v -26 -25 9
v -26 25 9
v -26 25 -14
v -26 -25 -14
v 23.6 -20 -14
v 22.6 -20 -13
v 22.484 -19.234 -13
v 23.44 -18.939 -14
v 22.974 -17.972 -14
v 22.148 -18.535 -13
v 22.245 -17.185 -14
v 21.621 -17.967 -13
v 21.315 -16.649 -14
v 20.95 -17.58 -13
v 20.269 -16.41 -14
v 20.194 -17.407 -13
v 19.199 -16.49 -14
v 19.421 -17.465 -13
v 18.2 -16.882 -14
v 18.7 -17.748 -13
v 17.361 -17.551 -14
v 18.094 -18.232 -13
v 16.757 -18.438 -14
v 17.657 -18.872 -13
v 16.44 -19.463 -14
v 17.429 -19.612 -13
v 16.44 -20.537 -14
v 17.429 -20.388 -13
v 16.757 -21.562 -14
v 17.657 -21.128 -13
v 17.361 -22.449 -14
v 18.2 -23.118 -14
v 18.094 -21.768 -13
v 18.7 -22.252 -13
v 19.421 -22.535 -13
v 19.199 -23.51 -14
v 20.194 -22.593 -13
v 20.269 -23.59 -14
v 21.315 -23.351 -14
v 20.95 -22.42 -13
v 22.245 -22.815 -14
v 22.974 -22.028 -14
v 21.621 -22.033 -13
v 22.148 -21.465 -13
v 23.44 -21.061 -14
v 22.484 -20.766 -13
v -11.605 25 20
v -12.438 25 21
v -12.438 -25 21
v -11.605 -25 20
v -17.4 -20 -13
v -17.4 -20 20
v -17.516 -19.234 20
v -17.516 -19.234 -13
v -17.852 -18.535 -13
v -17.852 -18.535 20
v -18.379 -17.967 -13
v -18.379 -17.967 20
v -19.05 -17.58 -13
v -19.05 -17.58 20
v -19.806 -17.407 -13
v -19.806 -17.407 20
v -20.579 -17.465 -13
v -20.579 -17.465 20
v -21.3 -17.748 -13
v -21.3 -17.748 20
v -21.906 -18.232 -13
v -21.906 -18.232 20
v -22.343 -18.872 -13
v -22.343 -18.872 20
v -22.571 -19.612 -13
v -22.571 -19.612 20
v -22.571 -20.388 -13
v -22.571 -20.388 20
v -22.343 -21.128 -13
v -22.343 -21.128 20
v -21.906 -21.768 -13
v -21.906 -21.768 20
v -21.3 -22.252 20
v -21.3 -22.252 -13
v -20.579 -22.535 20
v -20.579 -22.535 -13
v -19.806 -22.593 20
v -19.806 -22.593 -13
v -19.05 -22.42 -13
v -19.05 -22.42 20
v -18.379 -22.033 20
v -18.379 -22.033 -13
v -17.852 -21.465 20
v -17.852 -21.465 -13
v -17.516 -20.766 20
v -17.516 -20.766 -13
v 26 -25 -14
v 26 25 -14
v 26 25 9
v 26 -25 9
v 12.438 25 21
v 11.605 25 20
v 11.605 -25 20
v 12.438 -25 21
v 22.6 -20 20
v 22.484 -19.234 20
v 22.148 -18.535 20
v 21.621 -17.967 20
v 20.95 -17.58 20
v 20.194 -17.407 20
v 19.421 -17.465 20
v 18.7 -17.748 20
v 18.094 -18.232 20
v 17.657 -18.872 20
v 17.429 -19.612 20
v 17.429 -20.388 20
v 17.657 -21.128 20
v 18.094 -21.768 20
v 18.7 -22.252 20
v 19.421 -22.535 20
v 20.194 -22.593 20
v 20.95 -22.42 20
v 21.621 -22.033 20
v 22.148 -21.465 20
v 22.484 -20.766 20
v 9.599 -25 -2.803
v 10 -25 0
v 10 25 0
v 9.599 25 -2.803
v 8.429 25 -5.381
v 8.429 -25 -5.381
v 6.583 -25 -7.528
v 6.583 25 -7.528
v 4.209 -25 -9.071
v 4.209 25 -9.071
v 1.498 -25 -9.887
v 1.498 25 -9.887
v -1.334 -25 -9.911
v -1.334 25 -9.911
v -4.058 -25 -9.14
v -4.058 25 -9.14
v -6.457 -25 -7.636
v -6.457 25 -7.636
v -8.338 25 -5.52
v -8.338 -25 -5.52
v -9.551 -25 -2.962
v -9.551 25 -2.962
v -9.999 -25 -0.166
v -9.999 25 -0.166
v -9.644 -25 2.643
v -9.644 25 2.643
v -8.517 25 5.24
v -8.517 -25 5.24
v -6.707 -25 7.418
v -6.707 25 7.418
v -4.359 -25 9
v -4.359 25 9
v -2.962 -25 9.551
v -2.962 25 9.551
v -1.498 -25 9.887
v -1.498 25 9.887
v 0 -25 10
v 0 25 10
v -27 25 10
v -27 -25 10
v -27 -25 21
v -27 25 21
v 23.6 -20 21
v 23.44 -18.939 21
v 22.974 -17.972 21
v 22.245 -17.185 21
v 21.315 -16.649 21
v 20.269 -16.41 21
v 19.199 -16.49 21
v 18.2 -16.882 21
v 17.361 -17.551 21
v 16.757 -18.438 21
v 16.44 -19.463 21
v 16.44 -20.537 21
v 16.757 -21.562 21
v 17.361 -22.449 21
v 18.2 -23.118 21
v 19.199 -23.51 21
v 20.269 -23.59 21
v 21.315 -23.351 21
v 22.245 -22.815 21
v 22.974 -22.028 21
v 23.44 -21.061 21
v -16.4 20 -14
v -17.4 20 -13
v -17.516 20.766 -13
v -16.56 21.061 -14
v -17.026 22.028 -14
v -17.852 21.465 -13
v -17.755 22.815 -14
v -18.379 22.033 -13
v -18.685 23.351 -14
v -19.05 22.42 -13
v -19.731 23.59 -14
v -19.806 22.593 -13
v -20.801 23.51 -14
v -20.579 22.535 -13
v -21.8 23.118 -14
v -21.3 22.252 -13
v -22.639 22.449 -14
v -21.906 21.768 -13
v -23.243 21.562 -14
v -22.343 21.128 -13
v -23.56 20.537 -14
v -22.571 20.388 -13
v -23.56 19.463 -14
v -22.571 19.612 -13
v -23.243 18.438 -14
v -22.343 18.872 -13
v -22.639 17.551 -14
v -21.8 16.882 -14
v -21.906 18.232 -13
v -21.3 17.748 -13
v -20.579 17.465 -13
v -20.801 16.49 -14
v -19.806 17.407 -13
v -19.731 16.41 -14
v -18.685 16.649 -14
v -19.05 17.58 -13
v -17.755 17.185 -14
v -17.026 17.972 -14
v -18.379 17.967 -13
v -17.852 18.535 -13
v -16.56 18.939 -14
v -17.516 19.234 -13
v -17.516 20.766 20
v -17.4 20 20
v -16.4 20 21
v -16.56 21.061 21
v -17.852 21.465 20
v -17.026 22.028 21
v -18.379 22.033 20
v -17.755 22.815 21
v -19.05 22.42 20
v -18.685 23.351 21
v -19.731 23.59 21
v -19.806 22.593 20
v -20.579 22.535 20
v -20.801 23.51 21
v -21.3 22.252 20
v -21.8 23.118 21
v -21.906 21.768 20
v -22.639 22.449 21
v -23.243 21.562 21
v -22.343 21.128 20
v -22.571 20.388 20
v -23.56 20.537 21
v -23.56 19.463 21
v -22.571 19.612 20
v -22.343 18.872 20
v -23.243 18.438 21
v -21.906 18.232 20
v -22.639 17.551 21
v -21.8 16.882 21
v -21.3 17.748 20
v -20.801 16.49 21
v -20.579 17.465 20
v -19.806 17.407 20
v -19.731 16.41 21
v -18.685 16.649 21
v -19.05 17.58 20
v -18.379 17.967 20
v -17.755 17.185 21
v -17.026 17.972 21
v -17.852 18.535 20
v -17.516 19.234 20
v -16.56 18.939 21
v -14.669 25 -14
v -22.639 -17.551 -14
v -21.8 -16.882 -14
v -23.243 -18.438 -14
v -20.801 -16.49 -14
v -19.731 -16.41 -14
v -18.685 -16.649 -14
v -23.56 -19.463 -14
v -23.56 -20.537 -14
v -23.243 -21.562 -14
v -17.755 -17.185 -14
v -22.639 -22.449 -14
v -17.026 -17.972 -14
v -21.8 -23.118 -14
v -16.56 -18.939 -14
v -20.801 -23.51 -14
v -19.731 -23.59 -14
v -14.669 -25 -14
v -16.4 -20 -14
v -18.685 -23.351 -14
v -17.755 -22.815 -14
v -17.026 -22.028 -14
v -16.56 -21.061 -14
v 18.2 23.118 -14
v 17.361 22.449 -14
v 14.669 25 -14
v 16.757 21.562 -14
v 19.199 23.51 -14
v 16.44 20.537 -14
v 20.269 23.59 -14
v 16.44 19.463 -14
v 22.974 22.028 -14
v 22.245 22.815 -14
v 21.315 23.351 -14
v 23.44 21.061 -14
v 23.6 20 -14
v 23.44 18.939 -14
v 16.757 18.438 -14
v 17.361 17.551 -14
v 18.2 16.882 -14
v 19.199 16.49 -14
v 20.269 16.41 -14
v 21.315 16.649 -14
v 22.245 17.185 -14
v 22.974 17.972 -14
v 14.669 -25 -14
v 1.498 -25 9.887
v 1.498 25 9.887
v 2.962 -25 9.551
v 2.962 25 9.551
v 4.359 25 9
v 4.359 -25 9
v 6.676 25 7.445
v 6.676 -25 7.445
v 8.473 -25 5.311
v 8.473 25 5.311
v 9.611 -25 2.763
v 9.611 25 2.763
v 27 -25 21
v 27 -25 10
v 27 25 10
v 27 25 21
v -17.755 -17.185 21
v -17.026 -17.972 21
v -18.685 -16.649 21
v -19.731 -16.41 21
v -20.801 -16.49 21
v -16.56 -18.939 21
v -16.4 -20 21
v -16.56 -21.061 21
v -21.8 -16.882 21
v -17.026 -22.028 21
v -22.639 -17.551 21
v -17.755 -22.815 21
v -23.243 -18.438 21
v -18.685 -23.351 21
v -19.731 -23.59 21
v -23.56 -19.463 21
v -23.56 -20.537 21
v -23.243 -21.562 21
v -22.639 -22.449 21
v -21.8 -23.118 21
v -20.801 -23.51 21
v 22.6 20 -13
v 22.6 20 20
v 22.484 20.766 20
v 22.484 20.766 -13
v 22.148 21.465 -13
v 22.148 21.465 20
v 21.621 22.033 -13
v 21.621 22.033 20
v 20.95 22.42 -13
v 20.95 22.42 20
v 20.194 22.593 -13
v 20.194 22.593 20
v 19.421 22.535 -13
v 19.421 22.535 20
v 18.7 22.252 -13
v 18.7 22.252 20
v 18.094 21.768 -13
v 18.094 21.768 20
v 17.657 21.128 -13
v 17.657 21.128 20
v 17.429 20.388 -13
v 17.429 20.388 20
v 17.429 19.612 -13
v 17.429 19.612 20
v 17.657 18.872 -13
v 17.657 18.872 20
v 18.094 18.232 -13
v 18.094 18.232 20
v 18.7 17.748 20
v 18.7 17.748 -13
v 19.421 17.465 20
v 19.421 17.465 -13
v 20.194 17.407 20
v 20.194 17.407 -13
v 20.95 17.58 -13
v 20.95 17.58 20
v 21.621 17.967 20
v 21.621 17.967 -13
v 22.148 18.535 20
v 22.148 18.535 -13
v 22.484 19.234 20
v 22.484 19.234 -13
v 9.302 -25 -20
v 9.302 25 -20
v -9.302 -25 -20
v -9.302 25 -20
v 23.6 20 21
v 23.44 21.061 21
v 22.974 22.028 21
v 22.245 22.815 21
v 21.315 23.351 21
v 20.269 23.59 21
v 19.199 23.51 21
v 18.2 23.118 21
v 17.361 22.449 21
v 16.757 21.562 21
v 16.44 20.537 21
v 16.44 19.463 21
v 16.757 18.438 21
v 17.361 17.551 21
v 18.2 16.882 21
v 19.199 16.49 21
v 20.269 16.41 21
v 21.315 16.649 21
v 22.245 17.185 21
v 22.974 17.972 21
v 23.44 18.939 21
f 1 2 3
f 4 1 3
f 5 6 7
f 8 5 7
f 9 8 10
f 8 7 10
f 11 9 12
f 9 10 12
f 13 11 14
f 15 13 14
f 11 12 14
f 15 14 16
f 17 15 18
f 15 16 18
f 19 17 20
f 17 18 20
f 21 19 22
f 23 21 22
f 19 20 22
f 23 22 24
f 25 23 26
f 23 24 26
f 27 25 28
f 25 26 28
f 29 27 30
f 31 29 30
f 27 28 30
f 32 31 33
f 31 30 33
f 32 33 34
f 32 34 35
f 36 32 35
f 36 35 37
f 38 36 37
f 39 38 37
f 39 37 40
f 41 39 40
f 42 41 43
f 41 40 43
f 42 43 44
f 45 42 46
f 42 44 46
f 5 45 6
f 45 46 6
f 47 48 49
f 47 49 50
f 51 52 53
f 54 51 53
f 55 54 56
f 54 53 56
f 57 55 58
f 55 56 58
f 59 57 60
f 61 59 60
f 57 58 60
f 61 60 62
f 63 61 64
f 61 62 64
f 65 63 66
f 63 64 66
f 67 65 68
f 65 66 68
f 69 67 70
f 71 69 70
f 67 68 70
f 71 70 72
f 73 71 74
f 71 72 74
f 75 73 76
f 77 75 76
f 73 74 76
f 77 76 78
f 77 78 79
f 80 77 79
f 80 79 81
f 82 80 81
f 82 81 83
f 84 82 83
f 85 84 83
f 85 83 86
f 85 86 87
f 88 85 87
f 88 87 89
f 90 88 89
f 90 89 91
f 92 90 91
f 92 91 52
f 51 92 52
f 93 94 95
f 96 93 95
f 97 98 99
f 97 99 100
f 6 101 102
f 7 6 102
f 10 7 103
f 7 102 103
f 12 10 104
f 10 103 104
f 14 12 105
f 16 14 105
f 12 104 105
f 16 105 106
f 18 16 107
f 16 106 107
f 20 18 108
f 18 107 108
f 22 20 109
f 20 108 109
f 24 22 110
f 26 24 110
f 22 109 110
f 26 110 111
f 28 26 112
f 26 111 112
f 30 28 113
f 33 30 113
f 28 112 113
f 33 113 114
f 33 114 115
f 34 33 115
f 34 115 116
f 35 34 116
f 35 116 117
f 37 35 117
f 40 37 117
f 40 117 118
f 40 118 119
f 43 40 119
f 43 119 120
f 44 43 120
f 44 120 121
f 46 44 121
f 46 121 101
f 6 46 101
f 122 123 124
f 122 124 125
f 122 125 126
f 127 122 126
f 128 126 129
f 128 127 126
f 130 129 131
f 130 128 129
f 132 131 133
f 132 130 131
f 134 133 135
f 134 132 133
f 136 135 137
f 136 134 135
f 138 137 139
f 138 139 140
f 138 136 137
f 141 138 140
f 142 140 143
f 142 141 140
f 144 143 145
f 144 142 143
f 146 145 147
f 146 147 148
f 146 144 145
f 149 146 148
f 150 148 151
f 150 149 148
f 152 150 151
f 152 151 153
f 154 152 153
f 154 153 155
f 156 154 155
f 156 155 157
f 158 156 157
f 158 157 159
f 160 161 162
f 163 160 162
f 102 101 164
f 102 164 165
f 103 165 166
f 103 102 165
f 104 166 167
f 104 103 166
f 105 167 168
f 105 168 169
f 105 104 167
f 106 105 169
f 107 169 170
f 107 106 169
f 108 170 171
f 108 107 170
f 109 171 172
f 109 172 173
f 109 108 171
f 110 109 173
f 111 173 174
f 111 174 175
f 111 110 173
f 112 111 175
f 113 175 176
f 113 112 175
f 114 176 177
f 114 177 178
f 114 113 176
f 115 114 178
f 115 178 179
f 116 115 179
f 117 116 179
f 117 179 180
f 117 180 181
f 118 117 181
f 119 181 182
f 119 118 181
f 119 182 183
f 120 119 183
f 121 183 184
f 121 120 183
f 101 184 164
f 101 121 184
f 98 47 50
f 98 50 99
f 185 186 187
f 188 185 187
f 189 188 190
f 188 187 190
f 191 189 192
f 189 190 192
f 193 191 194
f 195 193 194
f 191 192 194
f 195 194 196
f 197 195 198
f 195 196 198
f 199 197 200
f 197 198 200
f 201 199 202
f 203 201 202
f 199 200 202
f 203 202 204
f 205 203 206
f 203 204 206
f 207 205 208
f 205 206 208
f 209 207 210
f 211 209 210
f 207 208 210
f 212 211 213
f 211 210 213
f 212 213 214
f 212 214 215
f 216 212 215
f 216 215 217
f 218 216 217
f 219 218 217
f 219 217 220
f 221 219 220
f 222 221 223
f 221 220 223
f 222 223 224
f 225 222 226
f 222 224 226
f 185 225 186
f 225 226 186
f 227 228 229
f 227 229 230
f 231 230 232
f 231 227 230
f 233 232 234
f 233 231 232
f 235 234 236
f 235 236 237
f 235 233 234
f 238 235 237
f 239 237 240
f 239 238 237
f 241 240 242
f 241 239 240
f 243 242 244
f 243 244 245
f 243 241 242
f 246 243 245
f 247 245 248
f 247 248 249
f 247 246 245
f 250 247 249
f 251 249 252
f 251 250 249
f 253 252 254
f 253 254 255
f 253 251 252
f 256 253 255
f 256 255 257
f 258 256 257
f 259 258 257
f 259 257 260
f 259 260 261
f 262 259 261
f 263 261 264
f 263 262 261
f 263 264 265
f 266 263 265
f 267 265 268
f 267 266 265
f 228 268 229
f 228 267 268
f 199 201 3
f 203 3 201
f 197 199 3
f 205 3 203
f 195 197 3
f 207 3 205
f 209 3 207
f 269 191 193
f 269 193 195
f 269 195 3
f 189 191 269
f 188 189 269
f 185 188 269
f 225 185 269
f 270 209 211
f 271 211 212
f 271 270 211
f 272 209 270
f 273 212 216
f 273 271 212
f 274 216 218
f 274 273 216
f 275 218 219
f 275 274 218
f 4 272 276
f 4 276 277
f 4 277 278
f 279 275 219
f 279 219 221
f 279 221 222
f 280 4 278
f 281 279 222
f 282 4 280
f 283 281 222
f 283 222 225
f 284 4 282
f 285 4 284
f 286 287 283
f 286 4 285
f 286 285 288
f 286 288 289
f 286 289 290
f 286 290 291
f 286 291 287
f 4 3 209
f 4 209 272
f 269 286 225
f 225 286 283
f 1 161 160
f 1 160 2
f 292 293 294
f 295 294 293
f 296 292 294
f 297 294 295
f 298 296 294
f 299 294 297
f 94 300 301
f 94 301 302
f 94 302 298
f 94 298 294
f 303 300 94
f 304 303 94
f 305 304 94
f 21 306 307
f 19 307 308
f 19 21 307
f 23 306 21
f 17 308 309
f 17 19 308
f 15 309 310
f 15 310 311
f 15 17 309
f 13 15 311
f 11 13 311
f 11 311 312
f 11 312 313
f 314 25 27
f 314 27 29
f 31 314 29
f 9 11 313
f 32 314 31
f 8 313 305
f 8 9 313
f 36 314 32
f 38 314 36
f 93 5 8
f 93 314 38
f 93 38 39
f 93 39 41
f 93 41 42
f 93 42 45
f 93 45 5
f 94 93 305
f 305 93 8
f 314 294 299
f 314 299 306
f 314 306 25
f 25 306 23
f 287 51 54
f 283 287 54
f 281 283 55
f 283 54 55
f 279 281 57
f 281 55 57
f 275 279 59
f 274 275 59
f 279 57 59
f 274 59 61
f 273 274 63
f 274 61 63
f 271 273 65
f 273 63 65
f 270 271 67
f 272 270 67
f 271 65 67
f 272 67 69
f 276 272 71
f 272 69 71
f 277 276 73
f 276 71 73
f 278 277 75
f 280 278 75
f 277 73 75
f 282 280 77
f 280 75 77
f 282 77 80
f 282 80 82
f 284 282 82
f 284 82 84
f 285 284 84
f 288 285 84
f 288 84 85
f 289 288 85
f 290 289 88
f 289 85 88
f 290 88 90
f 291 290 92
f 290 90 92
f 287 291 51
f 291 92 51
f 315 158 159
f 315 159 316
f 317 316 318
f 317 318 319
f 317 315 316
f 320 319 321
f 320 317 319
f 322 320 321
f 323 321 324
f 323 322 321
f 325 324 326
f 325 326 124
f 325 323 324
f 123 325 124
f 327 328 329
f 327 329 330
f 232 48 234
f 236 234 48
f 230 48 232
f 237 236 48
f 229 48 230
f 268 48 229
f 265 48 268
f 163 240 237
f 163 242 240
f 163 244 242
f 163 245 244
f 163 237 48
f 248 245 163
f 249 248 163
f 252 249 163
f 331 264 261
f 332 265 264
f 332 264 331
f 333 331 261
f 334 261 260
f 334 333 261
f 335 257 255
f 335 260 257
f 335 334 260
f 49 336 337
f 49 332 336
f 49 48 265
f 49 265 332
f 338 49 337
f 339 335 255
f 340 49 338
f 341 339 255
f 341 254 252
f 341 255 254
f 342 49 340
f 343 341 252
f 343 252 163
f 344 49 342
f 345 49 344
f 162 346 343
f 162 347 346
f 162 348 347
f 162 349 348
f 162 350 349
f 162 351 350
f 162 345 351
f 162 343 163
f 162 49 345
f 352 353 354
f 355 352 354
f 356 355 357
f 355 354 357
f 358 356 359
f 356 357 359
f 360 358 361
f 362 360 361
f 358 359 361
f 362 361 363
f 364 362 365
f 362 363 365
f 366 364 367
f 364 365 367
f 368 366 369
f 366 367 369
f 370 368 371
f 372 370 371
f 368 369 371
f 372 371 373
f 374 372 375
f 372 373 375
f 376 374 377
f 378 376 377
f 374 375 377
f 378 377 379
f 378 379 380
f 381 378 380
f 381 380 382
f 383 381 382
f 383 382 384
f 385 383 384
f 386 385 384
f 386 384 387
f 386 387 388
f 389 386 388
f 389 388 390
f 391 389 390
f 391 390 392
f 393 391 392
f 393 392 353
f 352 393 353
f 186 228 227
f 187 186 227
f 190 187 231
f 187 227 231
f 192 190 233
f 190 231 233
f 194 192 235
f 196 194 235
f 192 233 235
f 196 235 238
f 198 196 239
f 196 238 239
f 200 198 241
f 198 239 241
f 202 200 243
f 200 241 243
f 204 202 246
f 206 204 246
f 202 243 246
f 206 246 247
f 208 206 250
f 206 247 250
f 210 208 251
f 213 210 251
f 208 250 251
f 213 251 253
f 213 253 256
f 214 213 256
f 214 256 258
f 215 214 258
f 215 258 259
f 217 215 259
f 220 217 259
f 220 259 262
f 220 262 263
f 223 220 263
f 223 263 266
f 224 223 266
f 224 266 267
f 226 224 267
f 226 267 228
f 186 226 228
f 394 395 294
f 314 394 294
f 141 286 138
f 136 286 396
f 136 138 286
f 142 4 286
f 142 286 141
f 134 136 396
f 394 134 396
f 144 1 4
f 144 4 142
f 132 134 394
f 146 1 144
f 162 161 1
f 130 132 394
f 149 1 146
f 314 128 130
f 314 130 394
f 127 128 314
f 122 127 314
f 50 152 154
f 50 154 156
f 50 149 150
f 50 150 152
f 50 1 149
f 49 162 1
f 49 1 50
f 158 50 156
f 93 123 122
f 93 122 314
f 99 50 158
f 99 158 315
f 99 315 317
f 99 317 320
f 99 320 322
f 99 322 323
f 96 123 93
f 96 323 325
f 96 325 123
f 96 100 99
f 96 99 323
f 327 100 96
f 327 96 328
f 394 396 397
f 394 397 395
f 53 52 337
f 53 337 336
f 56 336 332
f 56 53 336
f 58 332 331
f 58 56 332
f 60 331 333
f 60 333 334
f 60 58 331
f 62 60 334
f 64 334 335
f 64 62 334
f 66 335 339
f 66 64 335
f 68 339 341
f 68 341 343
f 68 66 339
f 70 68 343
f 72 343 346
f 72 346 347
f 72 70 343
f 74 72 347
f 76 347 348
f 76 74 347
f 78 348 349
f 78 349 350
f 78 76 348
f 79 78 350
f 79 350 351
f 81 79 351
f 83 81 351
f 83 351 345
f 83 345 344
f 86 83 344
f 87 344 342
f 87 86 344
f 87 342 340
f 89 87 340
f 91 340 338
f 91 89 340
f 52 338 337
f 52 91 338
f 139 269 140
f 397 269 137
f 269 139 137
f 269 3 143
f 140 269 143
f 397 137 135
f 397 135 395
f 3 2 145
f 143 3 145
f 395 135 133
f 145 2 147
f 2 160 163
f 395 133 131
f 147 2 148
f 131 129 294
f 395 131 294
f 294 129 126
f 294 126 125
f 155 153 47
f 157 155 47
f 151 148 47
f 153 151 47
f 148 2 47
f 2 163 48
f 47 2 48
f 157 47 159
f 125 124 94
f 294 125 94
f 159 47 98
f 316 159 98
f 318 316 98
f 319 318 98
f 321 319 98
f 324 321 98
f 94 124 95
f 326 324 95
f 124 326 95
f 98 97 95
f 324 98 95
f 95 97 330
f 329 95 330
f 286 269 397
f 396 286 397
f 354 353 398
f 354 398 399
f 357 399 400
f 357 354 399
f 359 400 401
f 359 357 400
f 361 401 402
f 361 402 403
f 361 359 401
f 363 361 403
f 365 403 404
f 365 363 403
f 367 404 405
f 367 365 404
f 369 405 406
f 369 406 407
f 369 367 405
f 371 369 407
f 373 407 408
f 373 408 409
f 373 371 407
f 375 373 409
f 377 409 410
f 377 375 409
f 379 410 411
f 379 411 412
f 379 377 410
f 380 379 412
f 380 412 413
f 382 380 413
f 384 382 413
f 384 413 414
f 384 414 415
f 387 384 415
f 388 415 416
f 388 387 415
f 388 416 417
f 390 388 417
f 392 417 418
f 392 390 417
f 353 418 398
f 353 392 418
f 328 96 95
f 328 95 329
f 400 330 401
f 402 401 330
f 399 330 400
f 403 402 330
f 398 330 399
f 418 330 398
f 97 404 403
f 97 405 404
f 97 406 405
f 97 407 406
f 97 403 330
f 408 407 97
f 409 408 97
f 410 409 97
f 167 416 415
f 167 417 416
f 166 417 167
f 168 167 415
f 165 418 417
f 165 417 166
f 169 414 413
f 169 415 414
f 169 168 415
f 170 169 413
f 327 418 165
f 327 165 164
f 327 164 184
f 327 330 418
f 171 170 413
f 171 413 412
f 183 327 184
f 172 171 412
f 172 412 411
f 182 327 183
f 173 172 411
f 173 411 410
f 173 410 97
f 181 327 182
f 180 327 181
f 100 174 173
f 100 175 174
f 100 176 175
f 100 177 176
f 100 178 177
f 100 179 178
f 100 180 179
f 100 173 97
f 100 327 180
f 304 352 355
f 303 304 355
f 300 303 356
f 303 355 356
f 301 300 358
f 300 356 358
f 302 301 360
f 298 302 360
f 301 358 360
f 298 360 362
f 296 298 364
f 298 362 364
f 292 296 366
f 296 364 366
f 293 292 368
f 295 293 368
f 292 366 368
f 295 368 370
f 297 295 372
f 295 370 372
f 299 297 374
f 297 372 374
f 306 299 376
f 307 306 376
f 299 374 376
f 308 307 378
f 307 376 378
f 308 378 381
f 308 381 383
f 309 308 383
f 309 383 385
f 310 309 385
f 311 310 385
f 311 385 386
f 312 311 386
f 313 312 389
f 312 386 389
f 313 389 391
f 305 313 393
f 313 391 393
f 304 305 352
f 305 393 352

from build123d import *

# Parameters (mm, degrees)
F0_W     = 1
F0_H     = 11
F1_DEPTH = 25
F3_DEPTH = 50
F4_R     = 2.6
F5_DEPTH = 41.001
F6_SIZE  = 1


with BuildPart() as f1:
    # F0 (on Front) → F1 (new body, symmetric)
    with BuildSketch(Plane.XZ):
        with Locations((26.5, 15.5)):
            Rectangle(F0_W, F0_H)
        with Locations((-26.5, 15.5)):
            Rectangle(F0_W, F0_H)
        Polygon((9.3024417906, -20), (14.6689019081, -14), (-14.6689019081, -14), (-9.3024417906, -20), align=None)
        Polygon((26, 10), (26, 9), (27, 10), align=None)
        Polygon((-27, 10), (-26, 9), (-26, 10), align=None)
        with BuildLine():
            ThreePointArc((4.3588989435, 9), (8.4731632061, 5.310885546), (10, 0))
            ThreePointArc((10, 0), (-5.310885546, -8.4731632061), (-4.3588989435, 9))
            Line((-4.3588989435, 9), (-26, 9))
            Line((-26, 9), (-26, -14))
            Line((-26, -14), (-14.6689019081, -14))
            Line((-14.6689019081, -14), (14.6689019081, -14))
            Line((14.6689019081, -14), (26, -14))
            Line((26, -14), (26, 9))
            Line((26, 9), (4.3588989435, 9))
        make_face()
        with BuildLine():
            Line((-26, 9), (-4.3588989435, 9))
            ThreePointArc((-4.3588989435, 9), (-2.2360679957, 9.7467943406), (-3.73e-08, 10))
            Line((-3.73e-08, 10), (-26, 10))
            Line((-26, 10), (-26, 9))
        make_face()
        Polygon((-26, 10), (-3.73e-08, 10), (26, 10), (26, 21), (-26, 21), align=None)
        with BuildLine():
            ThreePointArc((-3.73e-08, 10), (2.2360679593, 9.746794349), (4.3588989435, 9))
            Line((4.3588989435, 9), (26, 9))
            Line((26, 9), (26, 10))
            Line((26, 10), (-3.73e-08, 10))
        make_face()
    extrude(amount=F1_DEPTH, both=True)

    # F2 (on Front) → F3 (cut, symmetric)
    with BuildSketch(Plane.XZ):
        Polygon((11.6050554439, 20), (12.4383887773, 21), (-12.4383887773, 21), (-11.6050554439, 20), align=None)
    extrude(amount=F3_DEPTH, both=True, mode=Mode.SUBTRACT)

    # F4 (on face) → F5 (cut, through all)
    with BuildSketch(Plane.XY.offset(21)):
        with Locations((20, 20)):
            Circle(F4_R)
        with Locations((-20, 20)):
            Circle(F4_R)
        with Locations((-20, -20)):
            Circle(F4_R)
        with Locations((20, -20)):
            Circle(F4_R)
    extrude(amount=-F5_DEPTH, mode=Mode.SUBTRACT)

    # F6
    f6_edges = [f1.edges().sort_by_distance(p)[0] for p in [
        (17.4, -20, 21),
        (-22.6, -20, 21),
        (-22.6, 20, 21),
        (17.4, 20, 21),
        (17.4, 20, -14),
        (-22.6, 20, -14),
        (17.4, -20, -14),
        (-22.6, -20, -14),
    ]]
    chamfer(f6_edges, length=F6_SIZE)


solid = f1.part
